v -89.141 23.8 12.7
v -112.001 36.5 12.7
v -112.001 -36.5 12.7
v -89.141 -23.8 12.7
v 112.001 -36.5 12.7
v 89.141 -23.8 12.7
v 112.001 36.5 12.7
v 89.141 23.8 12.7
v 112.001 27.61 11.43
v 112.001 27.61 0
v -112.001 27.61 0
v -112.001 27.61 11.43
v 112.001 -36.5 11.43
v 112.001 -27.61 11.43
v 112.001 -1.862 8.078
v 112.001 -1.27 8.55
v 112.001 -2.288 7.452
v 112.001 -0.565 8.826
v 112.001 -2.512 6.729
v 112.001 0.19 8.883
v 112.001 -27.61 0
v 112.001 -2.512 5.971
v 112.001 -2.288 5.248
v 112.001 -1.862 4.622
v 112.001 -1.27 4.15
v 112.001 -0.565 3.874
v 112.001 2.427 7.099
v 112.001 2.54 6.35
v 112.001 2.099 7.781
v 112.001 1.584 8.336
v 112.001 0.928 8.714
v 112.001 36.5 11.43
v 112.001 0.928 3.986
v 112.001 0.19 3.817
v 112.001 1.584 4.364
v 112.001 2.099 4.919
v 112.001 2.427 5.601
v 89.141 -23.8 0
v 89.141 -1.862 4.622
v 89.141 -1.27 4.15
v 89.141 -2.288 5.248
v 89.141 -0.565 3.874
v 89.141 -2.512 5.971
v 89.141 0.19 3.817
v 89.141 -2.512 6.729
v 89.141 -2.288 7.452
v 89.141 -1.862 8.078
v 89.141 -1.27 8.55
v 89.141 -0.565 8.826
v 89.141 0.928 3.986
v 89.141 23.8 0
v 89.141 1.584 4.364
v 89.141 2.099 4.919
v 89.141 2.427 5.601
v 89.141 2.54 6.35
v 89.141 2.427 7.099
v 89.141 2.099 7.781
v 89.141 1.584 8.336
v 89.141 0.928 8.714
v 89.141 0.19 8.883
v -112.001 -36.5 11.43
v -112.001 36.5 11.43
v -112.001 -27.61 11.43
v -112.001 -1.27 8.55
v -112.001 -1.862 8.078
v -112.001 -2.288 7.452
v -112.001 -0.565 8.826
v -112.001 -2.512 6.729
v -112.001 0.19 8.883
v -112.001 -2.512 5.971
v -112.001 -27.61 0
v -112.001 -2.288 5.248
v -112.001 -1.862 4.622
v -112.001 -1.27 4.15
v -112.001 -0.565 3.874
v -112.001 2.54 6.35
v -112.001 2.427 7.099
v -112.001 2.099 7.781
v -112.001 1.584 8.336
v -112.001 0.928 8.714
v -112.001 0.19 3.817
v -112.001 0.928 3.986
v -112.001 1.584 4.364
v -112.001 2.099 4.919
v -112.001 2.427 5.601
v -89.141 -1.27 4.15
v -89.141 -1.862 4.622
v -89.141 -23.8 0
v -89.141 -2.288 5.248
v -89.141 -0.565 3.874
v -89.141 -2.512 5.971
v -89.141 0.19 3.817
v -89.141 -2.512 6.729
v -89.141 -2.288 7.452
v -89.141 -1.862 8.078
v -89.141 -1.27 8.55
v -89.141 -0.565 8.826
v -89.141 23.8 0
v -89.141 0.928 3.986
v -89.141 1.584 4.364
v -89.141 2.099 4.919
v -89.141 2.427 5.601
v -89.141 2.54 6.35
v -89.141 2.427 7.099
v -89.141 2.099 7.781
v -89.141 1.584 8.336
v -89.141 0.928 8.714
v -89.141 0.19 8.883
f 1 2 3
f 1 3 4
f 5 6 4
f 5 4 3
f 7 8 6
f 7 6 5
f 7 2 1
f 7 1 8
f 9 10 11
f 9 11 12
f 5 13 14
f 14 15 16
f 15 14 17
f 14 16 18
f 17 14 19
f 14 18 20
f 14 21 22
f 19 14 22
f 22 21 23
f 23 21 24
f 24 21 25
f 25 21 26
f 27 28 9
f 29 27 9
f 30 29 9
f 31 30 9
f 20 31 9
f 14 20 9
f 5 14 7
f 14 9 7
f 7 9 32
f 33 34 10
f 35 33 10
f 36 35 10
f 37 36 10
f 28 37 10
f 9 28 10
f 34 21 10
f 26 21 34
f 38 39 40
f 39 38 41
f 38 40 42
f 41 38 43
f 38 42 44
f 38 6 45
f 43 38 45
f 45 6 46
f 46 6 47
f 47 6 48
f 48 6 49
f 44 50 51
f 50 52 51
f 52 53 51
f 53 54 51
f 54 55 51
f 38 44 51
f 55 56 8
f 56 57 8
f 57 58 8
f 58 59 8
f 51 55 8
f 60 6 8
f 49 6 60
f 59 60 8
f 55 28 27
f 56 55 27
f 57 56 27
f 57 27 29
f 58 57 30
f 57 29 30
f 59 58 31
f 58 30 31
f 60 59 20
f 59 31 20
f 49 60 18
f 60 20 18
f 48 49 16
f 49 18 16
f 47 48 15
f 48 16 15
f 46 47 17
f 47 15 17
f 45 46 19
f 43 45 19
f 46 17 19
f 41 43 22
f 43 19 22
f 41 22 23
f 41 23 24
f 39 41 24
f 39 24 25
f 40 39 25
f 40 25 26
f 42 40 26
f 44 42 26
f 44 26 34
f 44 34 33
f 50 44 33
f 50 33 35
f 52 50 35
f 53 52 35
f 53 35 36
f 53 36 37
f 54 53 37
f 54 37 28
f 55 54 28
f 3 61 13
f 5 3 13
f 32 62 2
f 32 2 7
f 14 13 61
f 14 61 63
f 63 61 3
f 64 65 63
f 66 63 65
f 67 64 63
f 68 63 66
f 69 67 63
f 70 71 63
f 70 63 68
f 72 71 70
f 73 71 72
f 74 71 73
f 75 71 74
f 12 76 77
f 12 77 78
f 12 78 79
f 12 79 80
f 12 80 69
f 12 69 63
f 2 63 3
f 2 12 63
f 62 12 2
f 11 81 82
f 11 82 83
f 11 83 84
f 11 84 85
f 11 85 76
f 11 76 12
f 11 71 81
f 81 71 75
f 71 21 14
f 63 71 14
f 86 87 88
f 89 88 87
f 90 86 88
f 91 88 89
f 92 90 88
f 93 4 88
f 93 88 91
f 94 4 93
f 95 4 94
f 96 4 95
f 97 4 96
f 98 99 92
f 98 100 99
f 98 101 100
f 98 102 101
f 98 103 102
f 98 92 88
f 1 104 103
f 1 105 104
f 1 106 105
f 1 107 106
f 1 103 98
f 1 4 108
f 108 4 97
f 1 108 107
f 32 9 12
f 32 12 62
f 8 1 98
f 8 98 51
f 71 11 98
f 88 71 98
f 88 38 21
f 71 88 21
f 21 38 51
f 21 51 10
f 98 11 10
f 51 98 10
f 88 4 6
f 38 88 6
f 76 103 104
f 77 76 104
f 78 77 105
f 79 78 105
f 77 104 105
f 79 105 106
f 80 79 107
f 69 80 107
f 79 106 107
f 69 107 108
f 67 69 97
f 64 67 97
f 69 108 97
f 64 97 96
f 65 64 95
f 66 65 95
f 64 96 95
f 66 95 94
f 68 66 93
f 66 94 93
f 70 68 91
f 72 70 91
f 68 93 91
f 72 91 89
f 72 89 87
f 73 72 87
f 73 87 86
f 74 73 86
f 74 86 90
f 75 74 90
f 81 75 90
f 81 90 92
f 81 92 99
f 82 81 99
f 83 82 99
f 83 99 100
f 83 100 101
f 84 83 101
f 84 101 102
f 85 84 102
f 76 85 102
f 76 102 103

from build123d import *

# Parameters (mm, degrees)
F0_W     = 224.0026
F0_H     = 72.9996
F1_DEPTH = 12.7
F2_W     = 178.2826
F2_H     = 47.5996
F2_W_2   = 173.2026
F2_H_2   = 22.1996
F3_DEPTH = 25.4
F4_W     = 8.89
F4_H     = 11.43
F5_DEPTH = 508
F6_W     = 8.89
F6_H     = 11.43
F7_DEPTH = 508
F8_R     = 2.54
F9_DEPTH = 508


with BuildPart() as f1:
    # F0 (on Top) → F1 (new body)
    with BuildSketch(Plane.XY):
        Rectangle(F0_W, F0_H)
    extrude(amount=F1_DEPTH)

    # F2 (on face) → F3 (cut)
    with BuildSketch(Plane.XY.offset(12.7)):
        Rectangle(F2_W, F2_H)
        Rectangle(F2_W_2, F2_H_2, mode=Mode.SUBTRACT)
        Rectangle(F2_W_2, F2_H_2)
    extrude(amount=-F3_DEPTH, mode=Mode.SUBTRACT)

    # F4 (on face) → F5 (cut)
    with BuildSketch(Plane.YZ.offset(112.0013)):
        with Locations((-32.0548, 5.715)):
            Rectangle(F4_W, F4_H)
    extrude(amount=-F5_DEPTH, mode=Mode.SUBTRACT)

    # F6 (on face) → F7 (cut)
    with BuildSketch(Plane.YZ.offset(112.0013)):
        with Locations((32.0548, 5.715)):
            Rectangle(F6_W, F6_H)
    extrude(amount=-F7_DEPTH, mode=Mode.SUBTRACT)

    # F8 (on face) → F9 (cut)
    with BuildSketch(Plane.YZ.offset(112.0013)):
        with Locations((0, 6.35)):
            Circle(F8_R)
    extrude(amount=-F9_DEPTH, mode=Mode.SUBTRACT)


solid = f1.part
